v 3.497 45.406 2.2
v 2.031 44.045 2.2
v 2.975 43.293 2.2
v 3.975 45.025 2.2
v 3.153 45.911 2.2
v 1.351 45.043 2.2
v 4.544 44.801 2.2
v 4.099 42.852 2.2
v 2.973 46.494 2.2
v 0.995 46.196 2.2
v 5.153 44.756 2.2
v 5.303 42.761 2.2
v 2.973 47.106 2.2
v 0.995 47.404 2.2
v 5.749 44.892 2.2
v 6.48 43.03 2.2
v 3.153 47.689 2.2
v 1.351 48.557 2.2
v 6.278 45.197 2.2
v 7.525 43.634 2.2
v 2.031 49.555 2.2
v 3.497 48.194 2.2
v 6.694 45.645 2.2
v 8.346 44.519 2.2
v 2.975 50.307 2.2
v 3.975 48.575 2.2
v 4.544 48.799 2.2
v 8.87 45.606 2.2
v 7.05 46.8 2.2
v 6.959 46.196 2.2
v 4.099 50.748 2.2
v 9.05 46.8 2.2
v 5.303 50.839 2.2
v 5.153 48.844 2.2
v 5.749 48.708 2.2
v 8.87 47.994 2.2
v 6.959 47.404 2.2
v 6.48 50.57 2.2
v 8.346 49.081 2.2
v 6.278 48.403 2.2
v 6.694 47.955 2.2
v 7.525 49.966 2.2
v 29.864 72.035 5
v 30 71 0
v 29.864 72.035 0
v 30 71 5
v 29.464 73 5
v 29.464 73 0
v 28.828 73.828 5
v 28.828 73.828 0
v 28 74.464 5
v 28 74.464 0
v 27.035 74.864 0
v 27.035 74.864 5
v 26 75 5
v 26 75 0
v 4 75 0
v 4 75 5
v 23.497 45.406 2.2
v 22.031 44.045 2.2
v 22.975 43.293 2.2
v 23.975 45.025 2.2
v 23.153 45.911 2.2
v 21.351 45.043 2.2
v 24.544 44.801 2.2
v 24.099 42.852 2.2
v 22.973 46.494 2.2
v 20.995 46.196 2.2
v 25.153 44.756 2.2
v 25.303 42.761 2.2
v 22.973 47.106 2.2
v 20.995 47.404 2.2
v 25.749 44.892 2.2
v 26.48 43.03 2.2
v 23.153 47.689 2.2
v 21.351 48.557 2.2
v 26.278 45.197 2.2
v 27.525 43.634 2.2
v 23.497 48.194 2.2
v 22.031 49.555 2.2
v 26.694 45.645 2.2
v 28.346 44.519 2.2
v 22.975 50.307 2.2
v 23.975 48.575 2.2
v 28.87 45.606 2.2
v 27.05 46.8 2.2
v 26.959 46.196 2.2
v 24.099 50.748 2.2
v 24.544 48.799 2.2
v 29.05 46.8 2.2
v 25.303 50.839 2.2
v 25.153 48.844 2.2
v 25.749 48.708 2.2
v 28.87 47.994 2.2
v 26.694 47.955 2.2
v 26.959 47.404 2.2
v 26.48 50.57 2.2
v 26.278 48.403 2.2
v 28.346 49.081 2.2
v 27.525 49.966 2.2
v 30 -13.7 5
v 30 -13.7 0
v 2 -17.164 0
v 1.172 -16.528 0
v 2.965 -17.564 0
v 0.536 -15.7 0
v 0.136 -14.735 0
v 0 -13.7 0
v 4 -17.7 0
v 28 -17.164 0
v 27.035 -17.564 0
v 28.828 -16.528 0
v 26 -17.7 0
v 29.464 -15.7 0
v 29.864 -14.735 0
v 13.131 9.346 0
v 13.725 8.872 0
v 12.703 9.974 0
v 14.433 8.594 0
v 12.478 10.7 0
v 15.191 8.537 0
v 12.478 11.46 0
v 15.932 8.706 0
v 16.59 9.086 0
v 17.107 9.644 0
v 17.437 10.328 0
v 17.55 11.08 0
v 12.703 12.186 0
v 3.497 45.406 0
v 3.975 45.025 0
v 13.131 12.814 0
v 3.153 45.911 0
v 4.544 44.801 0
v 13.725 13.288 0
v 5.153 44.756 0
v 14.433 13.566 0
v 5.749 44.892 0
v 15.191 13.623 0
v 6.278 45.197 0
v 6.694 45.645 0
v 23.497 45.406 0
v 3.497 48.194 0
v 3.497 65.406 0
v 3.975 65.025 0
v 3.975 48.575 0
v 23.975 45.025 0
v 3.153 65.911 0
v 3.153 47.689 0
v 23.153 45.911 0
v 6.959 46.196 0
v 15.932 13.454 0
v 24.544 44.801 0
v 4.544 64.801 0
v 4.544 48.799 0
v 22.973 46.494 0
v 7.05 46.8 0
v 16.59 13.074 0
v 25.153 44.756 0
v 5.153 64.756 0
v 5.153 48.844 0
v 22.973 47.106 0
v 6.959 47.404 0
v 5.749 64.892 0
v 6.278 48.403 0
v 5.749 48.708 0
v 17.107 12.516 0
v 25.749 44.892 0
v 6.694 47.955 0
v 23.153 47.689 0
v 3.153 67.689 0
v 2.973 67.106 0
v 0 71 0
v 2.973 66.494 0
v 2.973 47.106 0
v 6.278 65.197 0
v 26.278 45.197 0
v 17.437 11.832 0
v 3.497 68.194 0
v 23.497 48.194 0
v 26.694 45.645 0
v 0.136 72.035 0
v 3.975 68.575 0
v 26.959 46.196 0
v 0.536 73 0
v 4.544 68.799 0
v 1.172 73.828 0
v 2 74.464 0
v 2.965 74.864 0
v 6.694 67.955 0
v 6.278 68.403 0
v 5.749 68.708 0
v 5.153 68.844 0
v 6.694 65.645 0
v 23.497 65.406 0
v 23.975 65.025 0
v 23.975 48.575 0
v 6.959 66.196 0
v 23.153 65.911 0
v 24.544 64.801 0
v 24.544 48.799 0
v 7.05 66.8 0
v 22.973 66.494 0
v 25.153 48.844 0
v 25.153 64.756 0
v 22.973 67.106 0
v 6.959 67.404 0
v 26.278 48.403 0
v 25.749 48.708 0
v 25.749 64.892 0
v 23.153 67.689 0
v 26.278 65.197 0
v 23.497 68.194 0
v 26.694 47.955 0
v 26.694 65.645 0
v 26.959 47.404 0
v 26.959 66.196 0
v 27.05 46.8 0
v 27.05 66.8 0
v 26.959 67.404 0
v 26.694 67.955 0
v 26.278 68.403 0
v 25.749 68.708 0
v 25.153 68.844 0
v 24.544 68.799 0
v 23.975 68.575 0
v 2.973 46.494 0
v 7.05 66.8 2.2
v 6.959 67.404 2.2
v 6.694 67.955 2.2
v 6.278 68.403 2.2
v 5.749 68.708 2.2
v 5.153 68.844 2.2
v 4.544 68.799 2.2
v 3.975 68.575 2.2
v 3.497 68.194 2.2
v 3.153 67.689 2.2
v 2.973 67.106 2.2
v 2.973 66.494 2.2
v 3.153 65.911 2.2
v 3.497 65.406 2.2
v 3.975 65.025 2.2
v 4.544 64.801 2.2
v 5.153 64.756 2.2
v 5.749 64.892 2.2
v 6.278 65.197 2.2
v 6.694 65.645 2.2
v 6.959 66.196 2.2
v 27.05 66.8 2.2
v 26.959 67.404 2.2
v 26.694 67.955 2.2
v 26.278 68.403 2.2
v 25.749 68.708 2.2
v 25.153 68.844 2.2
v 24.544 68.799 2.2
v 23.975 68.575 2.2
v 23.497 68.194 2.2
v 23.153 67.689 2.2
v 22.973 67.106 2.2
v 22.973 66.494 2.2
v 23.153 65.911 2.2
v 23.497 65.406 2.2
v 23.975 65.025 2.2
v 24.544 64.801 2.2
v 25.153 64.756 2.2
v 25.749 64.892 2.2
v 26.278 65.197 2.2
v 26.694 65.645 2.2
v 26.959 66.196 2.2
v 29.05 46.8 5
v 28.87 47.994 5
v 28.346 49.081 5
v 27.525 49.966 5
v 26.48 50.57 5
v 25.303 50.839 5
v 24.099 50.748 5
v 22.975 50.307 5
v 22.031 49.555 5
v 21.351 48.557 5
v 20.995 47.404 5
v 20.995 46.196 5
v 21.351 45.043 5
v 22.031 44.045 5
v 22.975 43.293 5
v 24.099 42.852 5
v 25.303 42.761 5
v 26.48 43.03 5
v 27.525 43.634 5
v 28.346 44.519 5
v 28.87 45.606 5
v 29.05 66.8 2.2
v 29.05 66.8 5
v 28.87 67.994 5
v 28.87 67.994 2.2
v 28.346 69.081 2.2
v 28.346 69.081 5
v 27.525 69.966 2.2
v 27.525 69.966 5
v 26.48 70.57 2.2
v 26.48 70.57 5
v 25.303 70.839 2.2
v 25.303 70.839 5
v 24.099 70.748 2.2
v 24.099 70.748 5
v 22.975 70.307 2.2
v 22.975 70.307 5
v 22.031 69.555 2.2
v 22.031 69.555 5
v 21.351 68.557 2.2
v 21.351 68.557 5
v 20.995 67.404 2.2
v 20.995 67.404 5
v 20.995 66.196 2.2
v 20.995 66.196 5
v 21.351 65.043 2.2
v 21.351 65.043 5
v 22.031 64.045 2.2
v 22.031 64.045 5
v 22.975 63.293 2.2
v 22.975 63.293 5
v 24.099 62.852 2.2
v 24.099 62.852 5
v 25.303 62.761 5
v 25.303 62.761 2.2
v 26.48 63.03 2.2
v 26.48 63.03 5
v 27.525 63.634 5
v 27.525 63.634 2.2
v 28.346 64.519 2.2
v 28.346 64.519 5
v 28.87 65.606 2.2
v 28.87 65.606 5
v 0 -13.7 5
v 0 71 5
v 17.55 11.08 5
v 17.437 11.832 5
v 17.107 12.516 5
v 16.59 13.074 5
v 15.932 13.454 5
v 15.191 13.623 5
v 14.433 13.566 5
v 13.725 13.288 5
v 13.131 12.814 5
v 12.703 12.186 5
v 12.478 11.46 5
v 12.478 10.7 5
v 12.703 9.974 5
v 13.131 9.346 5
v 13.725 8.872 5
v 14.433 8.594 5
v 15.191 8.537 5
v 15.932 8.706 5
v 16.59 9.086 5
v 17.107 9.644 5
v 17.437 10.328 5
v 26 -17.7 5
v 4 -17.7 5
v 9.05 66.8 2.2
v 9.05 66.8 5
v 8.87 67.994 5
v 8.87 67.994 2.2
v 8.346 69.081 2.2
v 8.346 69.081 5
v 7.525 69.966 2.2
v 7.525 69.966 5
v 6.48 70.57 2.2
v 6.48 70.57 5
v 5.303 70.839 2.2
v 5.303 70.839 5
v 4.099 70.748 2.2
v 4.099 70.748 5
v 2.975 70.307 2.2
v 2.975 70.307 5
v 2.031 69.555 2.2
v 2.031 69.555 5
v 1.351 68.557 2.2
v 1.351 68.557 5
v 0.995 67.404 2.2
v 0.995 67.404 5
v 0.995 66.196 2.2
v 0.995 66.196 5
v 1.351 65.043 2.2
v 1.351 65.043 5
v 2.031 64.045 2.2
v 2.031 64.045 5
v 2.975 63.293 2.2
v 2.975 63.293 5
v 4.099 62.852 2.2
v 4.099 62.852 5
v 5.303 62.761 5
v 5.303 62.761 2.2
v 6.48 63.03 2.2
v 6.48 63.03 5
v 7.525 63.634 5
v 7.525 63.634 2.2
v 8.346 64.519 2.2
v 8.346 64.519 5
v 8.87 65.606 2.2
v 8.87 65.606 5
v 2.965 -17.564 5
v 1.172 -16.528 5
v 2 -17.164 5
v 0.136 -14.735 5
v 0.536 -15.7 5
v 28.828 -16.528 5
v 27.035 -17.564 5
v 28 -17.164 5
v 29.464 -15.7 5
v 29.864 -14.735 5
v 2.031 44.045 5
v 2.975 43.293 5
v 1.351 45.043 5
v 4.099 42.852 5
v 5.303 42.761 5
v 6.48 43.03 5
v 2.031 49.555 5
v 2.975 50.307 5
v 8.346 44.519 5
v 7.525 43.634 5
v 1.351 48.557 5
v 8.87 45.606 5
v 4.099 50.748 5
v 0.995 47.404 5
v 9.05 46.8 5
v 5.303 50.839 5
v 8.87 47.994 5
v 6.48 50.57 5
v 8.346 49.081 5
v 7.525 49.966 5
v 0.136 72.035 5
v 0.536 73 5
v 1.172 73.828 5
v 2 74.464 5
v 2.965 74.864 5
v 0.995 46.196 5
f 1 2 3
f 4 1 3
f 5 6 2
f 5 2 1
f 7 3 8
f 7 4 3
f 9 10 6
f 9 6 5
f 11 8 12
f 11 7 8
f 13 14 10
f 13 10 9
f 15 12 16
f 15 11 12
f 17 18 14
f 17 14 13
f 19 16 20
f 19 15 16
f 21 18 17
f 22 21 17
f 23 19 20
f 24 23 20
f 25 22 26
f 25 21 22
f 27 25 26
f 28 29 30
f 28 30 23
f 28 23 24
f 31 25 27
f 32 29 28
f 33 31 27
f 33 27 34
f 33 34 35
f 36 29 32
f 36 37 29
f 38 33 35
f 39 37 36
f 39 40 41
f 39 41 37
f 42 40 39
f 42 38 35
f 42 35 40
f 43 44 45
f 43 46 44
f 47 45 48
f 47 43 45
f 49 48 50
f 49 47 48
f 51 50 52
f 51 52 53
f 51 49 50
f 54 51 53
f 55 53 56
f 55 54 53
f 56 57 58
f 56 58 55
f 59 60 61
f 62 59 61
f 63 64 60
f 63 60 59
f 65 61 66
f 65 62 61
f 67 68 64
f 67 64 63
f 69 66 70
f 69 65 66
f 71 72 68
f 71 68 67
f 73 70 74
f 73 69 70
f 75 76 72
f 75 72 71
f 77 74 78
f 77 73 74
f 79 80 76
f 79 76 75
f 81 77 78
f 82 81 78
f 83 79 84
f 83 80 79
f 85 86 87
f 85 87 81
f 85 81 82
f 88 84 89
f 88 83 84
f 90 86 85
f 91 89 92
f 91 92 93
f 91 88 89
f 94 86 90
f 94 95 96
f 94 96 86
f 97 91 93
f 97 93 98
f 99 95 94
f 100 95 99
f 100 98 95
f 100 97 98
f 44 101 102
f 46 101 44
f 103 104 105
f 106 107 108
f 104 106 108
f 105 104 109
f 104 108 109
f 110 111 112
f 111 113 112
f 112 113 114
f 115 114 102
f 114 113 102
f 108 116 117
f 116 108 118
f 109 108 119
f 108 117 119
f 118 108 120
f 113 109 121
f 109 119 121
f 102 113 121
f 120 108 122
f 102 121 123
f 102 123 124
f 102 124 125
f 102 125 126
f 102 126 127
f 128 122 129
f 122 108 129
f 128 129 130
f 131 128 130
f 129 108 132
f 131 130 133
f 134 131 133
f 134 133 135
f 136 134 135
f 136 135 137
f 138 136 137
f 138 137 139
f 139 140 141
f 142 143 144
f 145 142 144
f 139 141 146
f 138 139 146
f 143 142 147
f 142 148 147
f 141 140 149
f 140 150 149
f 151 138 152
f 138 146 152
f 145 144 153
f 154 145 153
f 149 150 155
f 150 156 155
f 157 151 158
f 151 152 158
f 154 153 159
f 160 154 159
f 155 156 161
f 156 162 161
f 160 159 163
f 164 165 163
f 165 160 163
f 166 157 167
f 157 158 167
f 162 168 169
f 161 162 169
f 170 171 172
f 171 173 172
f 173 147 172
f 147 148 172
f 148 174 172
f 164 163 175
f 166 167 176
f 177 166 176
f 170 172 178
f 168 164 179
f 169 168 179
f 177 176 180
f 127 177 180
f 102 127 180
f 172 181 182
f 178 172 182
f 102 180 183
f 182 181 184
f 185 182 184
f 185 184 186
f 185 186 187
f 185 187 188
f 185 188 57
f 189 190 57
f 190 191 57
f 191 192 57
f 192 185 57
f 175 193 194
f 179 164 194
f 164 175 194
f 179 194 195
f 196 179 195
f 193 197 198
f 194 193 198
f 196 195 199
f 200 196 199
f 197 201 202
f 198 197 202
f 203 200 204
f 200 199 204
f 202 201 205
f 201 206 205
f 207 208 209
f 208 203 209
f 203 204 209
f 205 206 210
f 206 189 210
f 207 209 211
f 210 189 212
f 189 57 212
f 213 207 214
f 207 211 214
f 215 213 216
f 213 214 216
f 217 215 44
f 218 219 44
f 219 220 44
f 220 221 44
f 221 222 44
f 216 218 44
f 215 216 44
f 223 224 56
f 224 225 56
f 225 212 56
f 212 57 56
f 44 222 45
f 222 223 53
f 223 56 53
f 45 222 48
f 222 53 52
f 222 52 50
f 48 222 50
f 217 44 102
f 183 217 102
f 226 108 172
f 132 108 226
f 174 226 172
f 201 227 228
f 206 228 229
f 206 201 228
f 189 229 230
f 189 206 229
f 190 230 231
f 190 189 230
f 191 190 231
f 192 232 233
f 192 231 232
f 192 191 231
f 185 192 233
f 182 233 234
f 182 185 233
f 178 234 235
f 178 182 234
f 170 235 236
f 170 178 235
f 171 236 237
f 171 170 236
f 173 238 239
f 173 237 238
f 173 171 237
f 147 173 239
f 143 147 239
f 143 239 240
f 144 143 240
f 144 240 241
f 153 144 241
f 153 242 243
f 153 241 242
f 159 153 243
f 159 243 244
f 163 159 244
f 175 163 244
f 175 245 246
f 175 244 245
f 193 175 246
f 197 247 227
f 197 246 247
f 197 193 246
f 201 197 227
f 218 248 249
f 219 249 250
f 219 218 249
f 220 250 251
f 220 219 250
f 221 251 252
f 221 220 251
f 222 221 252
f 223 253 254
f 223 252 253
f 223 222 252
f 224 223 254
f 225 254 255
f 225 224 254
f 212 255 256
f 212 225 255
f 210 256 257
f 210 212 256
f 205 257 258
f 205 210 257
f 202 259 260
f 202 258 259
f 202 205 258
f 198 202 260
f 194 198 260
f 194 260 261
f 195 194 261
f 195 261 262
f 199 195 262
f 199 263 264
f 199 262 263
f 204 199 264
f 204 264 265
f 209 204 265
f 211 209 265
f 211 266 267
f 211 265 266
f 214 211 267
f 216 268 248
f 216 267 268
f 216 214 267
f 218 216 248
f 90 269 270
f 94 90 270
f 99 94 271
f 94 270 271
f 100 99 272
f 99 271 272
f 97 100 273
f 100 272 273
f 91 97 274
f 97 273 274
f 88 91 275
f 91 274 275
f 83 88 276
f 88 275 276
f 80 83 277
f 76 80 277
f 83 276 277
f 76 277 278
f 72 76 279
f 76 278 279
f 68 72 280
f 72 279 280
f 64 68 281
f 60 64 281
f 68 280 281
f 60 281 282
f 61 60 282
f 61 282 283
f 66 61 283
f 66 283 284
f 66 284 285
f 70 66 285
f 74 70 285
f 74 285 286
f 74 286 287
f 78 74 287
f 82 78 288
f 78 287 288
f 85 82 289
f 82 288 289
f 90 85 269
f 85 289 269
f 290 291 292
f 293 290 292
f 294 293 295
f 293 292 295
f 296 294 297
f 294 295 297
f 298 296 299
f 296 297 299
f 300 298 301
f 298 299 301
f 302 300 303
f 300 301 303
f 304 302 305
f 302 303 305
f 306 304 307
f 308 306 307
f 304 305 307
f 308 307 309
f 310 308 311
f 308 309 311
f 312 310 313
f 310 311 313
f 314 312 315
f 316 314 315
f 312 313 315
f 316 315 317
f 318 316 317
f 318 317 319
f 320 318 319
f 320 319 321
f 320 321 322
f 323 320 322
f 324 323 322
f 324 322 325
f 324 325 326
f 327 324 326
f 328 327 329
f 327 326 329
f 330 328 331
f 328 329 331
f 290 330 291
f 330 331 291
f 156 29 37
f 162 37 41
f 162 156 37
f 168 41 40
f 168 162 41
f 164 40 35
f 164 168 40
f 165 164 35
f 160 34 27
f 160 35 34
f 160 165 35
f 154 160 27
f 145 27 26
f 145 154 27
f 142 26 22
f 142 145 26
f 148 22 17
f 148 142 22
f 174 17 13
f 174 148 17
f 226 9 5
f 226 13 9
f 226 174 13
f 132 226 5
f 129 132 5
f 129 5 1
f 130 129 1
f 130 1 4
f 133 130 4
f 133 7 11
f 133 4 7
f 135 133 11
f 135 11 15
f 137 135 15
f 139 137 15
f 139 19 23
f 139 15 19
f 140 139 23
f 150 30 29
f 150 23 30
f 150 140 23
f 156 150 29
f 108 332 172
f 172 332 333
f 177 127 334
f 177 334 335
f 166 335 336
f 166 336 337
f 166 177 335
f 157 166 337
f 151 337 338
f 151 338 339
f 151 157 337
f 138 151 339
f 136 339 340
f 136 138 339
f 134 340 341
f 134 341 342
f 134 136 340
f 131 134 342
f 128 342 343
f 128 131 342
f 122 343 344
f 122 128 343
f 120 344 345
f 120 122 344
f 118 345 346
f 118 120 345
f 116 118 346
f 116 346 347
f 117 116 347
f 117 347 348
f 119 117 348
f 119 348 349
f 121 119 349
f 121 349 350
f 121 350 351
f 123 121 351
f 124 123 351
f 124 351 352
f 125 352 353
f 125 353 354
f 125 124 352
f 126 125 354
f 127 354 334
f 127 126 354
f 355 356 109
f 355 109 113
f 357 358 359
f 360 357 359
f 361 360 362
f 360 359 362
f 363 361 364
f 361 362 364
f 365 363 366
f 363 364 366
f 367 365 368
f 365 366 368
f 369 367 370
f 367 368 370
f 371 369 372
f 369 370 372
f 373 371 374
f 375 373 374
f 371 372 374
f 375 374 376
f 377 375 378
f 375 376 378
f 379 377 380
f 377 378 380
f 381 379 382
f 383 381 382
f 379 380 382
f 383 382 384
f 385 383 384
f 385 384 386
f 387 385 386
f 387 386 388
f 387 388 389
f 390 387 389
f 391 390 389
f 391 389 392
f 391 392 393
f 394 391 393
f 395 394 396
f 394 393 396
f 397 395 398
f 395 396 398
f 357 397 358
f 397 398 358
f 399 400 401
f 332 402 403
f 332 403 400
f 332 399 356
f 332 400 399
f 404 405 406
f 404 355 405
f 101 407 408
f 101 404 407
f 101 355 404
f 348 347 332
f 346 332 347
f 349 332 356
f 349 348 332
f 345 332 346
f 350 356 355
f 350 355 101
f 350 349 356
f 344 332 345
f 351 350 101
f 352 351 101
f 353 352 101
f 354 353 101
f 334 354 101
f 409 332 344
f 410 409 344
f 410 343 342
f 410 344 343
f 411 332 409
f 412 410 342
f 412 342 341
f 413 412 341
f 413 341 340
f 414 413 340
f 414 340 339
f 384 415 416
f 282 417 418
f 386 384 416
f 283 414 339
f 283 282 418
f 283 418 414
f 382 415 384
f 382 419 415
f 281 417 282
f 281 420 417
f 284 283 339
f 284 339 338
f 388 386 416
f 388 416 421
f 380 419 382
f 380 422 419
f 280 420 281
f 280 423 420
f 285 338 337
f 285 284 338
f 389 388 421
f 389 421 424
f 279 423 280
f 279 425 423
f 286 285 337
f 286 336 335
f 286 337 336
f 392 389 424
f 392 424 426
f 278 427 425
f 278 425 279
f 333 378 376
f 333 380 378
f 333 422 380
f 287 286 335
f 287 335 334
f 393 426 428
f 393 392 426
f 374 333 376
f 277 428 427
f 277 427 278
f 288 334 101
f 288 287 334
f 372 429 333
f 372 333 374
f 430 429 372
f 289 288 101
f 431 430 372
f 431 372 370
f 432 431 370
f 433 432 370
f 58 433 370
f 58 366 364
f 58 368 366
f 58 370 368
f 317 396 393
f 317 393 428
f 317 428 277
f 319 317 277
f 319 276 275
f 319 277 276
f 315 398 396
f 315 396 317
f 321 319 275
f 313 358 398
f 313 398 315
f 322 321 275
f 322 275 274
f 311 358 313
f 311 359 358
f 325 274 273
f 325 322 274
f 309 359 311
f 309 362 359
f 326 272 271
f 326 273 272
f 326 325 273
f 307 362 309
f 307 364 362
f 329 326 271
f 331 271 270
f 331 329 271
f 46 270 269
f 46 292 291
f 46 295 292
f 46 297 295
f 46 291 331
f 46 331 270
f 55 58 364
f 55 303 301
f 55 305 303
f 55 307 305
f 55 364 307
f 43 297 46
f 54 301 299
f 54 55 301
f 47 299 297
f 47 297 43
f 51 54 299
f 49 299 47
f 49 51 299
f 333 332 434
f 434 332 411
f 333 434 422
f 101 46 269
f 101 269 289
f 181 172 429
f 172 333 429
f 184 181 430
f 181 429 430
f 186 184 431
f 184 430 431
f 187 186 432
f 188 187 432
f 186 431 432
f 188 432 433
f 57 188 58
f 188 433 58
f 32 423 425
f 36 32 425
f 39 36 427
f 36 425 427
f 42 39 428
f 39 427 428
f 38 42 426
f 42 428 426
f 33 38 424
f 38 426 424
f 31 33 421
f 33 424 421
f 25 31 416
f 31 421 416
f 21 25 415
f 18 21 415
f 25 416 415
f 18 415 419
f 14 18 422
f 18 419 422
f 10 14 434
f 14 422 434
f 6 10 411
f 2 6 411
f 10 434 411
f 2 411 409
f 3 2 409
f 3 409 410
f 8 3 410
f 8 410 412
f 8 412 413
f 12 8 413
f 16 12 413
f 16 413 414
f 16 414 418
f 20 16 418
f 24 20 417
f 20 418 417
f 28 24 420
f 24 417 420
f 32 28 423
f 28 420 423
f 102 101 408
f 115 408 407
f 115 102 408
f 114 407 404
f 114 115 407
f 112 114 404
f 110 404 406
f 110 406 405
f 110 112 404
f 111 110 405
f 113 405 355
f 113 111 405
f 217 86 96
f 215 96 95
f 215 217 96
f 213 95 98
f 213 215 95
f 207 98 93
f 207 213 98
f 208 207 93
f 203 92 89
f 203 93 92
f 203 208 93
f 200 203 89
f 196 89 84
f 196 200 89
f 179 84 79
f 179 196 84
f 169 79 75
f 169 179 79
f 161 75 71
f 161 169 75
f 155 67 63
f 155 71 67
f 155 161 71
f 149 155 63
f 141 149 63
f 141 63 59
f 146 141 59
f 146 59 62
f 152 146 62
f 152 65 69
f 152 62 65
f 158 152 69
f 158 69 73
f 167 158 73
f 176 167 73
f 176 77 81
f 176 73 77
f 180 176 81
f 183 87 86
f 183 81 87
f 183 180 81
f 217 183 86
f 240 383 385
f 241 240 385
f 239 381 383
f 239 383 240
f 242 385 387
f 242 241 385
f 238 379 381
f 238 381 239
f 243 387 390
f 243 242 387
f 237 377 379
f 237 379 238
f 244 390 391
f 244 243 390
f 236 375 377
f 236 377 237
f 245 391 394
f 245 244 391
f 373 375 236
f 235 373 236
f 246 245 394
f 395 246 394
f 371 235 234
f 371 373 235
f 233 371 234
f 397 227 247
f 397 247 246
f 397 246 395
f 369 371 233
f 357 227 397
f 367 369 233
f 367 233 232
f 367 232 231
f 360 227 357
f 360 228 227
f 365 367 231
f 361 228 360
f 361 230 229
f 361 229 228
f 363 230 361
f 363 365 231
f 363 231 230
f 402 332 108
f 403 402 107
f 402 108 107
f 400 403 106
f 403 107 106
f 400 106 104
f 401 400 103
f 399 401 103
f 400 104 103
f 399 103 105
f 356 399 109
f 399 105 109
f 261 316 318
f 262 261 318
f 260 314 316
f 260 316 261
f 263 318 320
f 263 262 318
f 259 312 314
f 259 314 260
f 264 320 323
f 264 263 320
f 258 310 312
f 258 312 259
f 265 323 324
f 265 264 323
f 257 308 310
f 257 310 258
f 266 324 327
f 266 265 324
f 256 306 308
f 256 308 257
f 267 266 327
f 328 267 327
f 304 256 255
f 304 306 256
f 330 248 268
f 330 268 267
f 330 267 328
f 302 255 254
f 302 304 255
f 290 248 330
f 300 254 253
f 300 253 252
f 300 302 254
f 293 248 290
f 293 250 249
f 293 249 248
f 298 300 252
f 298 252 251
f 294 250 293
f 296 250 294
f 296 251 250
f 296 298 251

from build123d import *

# Parameters (mm, degrees)
CROQUIS1_W              = 30
CROQUIS1_H              = 75
CROQUIS1_R              = 2.05
CROQUIS1_R_2            = 2.55
SALIENTE_EXTRUIR1_DEPTH = 5
CROQUIS4_R              = 4.05
CORTAR_EXTRUIR1_DEPTH   = 2.8
CROQUIS5_W              = 30
CROQUIS5_H              = 17.7
SALIENTE_EXTRUIR2_DEPTH = 5
REDONDEO1_R             = 4


with BuildPart() as part:
    # Croquis1 → Saliente-Extruir1 (new body)
    with BuildSketch(Plane.XY):
        with Locations((15, 37.5)):
            Rectangle(CROQUIS1_W, CROQUIS1_H)
        with Locations((5, 66.8)):
            Circle(CROQUIS1_R, mode=Mode.SUBTRACT)
        with Locations((25, 66.8)):
            Circle(CROQUIS1_R, mode=Mode.SUBTRACT)
        with Locations((25, 46.8)):
            Circle(CROQUIS1_R, mode=Mode.SUBTRACT)
        with Locations((5, 46.8)):
            Circle(CROQUIS1_R, mode=Mode.SUBTRACT)
        with Locations((15, 11.08)):
            Circle(CROQUIS1_R_2, mode=Mode.SUBTRACT)
    extrude(amount=SALIENTE_EXTRUIR1_DEPTH)

    # Croquis4 → Cortar-Extruir1 (cut)
    with BuildSketch(Plane.XY.offset(5)):
        with Locations((5, 66.8)):
            Circle(CROQUIS4_R)
        with Locations((5, 46.8)):
            Circle(CROQUIS4_R)
        with Locations((25, 46.8)):
            Circle(CROQUIS4_R)
        with Locations((25, 66.8)):
            Circle(CROQUIS4_R)
    extrude(amount=-CORTAR_EXTRUIR1_DEPTH, mode=Mode.SUBTRACT)

    # Croquis5 → Saliente-Extruir2 (add, through all)
    with BuildSketch(Plane.XY.offset(5)):
        with Locations((15, -8.85)):
            Rectangle(CROQUIS5_W, CROQUIS5_H)
    extrude(amount=-SALIENTE_EXTRUIR2_DEPTH)

    # Redondeo1
    redondeo1_edges = [part.edges().sort_by_distance(p)[0] for p in [
        (0, -17.7, 2.5),
        (30, -17.7, 2.5),
        (0, 75, 2.5),
        (30, 75, 2.5),
    ]]
    fillet(redondeo1_edges, radius=REDONDEO1_R)


solid = part.part
